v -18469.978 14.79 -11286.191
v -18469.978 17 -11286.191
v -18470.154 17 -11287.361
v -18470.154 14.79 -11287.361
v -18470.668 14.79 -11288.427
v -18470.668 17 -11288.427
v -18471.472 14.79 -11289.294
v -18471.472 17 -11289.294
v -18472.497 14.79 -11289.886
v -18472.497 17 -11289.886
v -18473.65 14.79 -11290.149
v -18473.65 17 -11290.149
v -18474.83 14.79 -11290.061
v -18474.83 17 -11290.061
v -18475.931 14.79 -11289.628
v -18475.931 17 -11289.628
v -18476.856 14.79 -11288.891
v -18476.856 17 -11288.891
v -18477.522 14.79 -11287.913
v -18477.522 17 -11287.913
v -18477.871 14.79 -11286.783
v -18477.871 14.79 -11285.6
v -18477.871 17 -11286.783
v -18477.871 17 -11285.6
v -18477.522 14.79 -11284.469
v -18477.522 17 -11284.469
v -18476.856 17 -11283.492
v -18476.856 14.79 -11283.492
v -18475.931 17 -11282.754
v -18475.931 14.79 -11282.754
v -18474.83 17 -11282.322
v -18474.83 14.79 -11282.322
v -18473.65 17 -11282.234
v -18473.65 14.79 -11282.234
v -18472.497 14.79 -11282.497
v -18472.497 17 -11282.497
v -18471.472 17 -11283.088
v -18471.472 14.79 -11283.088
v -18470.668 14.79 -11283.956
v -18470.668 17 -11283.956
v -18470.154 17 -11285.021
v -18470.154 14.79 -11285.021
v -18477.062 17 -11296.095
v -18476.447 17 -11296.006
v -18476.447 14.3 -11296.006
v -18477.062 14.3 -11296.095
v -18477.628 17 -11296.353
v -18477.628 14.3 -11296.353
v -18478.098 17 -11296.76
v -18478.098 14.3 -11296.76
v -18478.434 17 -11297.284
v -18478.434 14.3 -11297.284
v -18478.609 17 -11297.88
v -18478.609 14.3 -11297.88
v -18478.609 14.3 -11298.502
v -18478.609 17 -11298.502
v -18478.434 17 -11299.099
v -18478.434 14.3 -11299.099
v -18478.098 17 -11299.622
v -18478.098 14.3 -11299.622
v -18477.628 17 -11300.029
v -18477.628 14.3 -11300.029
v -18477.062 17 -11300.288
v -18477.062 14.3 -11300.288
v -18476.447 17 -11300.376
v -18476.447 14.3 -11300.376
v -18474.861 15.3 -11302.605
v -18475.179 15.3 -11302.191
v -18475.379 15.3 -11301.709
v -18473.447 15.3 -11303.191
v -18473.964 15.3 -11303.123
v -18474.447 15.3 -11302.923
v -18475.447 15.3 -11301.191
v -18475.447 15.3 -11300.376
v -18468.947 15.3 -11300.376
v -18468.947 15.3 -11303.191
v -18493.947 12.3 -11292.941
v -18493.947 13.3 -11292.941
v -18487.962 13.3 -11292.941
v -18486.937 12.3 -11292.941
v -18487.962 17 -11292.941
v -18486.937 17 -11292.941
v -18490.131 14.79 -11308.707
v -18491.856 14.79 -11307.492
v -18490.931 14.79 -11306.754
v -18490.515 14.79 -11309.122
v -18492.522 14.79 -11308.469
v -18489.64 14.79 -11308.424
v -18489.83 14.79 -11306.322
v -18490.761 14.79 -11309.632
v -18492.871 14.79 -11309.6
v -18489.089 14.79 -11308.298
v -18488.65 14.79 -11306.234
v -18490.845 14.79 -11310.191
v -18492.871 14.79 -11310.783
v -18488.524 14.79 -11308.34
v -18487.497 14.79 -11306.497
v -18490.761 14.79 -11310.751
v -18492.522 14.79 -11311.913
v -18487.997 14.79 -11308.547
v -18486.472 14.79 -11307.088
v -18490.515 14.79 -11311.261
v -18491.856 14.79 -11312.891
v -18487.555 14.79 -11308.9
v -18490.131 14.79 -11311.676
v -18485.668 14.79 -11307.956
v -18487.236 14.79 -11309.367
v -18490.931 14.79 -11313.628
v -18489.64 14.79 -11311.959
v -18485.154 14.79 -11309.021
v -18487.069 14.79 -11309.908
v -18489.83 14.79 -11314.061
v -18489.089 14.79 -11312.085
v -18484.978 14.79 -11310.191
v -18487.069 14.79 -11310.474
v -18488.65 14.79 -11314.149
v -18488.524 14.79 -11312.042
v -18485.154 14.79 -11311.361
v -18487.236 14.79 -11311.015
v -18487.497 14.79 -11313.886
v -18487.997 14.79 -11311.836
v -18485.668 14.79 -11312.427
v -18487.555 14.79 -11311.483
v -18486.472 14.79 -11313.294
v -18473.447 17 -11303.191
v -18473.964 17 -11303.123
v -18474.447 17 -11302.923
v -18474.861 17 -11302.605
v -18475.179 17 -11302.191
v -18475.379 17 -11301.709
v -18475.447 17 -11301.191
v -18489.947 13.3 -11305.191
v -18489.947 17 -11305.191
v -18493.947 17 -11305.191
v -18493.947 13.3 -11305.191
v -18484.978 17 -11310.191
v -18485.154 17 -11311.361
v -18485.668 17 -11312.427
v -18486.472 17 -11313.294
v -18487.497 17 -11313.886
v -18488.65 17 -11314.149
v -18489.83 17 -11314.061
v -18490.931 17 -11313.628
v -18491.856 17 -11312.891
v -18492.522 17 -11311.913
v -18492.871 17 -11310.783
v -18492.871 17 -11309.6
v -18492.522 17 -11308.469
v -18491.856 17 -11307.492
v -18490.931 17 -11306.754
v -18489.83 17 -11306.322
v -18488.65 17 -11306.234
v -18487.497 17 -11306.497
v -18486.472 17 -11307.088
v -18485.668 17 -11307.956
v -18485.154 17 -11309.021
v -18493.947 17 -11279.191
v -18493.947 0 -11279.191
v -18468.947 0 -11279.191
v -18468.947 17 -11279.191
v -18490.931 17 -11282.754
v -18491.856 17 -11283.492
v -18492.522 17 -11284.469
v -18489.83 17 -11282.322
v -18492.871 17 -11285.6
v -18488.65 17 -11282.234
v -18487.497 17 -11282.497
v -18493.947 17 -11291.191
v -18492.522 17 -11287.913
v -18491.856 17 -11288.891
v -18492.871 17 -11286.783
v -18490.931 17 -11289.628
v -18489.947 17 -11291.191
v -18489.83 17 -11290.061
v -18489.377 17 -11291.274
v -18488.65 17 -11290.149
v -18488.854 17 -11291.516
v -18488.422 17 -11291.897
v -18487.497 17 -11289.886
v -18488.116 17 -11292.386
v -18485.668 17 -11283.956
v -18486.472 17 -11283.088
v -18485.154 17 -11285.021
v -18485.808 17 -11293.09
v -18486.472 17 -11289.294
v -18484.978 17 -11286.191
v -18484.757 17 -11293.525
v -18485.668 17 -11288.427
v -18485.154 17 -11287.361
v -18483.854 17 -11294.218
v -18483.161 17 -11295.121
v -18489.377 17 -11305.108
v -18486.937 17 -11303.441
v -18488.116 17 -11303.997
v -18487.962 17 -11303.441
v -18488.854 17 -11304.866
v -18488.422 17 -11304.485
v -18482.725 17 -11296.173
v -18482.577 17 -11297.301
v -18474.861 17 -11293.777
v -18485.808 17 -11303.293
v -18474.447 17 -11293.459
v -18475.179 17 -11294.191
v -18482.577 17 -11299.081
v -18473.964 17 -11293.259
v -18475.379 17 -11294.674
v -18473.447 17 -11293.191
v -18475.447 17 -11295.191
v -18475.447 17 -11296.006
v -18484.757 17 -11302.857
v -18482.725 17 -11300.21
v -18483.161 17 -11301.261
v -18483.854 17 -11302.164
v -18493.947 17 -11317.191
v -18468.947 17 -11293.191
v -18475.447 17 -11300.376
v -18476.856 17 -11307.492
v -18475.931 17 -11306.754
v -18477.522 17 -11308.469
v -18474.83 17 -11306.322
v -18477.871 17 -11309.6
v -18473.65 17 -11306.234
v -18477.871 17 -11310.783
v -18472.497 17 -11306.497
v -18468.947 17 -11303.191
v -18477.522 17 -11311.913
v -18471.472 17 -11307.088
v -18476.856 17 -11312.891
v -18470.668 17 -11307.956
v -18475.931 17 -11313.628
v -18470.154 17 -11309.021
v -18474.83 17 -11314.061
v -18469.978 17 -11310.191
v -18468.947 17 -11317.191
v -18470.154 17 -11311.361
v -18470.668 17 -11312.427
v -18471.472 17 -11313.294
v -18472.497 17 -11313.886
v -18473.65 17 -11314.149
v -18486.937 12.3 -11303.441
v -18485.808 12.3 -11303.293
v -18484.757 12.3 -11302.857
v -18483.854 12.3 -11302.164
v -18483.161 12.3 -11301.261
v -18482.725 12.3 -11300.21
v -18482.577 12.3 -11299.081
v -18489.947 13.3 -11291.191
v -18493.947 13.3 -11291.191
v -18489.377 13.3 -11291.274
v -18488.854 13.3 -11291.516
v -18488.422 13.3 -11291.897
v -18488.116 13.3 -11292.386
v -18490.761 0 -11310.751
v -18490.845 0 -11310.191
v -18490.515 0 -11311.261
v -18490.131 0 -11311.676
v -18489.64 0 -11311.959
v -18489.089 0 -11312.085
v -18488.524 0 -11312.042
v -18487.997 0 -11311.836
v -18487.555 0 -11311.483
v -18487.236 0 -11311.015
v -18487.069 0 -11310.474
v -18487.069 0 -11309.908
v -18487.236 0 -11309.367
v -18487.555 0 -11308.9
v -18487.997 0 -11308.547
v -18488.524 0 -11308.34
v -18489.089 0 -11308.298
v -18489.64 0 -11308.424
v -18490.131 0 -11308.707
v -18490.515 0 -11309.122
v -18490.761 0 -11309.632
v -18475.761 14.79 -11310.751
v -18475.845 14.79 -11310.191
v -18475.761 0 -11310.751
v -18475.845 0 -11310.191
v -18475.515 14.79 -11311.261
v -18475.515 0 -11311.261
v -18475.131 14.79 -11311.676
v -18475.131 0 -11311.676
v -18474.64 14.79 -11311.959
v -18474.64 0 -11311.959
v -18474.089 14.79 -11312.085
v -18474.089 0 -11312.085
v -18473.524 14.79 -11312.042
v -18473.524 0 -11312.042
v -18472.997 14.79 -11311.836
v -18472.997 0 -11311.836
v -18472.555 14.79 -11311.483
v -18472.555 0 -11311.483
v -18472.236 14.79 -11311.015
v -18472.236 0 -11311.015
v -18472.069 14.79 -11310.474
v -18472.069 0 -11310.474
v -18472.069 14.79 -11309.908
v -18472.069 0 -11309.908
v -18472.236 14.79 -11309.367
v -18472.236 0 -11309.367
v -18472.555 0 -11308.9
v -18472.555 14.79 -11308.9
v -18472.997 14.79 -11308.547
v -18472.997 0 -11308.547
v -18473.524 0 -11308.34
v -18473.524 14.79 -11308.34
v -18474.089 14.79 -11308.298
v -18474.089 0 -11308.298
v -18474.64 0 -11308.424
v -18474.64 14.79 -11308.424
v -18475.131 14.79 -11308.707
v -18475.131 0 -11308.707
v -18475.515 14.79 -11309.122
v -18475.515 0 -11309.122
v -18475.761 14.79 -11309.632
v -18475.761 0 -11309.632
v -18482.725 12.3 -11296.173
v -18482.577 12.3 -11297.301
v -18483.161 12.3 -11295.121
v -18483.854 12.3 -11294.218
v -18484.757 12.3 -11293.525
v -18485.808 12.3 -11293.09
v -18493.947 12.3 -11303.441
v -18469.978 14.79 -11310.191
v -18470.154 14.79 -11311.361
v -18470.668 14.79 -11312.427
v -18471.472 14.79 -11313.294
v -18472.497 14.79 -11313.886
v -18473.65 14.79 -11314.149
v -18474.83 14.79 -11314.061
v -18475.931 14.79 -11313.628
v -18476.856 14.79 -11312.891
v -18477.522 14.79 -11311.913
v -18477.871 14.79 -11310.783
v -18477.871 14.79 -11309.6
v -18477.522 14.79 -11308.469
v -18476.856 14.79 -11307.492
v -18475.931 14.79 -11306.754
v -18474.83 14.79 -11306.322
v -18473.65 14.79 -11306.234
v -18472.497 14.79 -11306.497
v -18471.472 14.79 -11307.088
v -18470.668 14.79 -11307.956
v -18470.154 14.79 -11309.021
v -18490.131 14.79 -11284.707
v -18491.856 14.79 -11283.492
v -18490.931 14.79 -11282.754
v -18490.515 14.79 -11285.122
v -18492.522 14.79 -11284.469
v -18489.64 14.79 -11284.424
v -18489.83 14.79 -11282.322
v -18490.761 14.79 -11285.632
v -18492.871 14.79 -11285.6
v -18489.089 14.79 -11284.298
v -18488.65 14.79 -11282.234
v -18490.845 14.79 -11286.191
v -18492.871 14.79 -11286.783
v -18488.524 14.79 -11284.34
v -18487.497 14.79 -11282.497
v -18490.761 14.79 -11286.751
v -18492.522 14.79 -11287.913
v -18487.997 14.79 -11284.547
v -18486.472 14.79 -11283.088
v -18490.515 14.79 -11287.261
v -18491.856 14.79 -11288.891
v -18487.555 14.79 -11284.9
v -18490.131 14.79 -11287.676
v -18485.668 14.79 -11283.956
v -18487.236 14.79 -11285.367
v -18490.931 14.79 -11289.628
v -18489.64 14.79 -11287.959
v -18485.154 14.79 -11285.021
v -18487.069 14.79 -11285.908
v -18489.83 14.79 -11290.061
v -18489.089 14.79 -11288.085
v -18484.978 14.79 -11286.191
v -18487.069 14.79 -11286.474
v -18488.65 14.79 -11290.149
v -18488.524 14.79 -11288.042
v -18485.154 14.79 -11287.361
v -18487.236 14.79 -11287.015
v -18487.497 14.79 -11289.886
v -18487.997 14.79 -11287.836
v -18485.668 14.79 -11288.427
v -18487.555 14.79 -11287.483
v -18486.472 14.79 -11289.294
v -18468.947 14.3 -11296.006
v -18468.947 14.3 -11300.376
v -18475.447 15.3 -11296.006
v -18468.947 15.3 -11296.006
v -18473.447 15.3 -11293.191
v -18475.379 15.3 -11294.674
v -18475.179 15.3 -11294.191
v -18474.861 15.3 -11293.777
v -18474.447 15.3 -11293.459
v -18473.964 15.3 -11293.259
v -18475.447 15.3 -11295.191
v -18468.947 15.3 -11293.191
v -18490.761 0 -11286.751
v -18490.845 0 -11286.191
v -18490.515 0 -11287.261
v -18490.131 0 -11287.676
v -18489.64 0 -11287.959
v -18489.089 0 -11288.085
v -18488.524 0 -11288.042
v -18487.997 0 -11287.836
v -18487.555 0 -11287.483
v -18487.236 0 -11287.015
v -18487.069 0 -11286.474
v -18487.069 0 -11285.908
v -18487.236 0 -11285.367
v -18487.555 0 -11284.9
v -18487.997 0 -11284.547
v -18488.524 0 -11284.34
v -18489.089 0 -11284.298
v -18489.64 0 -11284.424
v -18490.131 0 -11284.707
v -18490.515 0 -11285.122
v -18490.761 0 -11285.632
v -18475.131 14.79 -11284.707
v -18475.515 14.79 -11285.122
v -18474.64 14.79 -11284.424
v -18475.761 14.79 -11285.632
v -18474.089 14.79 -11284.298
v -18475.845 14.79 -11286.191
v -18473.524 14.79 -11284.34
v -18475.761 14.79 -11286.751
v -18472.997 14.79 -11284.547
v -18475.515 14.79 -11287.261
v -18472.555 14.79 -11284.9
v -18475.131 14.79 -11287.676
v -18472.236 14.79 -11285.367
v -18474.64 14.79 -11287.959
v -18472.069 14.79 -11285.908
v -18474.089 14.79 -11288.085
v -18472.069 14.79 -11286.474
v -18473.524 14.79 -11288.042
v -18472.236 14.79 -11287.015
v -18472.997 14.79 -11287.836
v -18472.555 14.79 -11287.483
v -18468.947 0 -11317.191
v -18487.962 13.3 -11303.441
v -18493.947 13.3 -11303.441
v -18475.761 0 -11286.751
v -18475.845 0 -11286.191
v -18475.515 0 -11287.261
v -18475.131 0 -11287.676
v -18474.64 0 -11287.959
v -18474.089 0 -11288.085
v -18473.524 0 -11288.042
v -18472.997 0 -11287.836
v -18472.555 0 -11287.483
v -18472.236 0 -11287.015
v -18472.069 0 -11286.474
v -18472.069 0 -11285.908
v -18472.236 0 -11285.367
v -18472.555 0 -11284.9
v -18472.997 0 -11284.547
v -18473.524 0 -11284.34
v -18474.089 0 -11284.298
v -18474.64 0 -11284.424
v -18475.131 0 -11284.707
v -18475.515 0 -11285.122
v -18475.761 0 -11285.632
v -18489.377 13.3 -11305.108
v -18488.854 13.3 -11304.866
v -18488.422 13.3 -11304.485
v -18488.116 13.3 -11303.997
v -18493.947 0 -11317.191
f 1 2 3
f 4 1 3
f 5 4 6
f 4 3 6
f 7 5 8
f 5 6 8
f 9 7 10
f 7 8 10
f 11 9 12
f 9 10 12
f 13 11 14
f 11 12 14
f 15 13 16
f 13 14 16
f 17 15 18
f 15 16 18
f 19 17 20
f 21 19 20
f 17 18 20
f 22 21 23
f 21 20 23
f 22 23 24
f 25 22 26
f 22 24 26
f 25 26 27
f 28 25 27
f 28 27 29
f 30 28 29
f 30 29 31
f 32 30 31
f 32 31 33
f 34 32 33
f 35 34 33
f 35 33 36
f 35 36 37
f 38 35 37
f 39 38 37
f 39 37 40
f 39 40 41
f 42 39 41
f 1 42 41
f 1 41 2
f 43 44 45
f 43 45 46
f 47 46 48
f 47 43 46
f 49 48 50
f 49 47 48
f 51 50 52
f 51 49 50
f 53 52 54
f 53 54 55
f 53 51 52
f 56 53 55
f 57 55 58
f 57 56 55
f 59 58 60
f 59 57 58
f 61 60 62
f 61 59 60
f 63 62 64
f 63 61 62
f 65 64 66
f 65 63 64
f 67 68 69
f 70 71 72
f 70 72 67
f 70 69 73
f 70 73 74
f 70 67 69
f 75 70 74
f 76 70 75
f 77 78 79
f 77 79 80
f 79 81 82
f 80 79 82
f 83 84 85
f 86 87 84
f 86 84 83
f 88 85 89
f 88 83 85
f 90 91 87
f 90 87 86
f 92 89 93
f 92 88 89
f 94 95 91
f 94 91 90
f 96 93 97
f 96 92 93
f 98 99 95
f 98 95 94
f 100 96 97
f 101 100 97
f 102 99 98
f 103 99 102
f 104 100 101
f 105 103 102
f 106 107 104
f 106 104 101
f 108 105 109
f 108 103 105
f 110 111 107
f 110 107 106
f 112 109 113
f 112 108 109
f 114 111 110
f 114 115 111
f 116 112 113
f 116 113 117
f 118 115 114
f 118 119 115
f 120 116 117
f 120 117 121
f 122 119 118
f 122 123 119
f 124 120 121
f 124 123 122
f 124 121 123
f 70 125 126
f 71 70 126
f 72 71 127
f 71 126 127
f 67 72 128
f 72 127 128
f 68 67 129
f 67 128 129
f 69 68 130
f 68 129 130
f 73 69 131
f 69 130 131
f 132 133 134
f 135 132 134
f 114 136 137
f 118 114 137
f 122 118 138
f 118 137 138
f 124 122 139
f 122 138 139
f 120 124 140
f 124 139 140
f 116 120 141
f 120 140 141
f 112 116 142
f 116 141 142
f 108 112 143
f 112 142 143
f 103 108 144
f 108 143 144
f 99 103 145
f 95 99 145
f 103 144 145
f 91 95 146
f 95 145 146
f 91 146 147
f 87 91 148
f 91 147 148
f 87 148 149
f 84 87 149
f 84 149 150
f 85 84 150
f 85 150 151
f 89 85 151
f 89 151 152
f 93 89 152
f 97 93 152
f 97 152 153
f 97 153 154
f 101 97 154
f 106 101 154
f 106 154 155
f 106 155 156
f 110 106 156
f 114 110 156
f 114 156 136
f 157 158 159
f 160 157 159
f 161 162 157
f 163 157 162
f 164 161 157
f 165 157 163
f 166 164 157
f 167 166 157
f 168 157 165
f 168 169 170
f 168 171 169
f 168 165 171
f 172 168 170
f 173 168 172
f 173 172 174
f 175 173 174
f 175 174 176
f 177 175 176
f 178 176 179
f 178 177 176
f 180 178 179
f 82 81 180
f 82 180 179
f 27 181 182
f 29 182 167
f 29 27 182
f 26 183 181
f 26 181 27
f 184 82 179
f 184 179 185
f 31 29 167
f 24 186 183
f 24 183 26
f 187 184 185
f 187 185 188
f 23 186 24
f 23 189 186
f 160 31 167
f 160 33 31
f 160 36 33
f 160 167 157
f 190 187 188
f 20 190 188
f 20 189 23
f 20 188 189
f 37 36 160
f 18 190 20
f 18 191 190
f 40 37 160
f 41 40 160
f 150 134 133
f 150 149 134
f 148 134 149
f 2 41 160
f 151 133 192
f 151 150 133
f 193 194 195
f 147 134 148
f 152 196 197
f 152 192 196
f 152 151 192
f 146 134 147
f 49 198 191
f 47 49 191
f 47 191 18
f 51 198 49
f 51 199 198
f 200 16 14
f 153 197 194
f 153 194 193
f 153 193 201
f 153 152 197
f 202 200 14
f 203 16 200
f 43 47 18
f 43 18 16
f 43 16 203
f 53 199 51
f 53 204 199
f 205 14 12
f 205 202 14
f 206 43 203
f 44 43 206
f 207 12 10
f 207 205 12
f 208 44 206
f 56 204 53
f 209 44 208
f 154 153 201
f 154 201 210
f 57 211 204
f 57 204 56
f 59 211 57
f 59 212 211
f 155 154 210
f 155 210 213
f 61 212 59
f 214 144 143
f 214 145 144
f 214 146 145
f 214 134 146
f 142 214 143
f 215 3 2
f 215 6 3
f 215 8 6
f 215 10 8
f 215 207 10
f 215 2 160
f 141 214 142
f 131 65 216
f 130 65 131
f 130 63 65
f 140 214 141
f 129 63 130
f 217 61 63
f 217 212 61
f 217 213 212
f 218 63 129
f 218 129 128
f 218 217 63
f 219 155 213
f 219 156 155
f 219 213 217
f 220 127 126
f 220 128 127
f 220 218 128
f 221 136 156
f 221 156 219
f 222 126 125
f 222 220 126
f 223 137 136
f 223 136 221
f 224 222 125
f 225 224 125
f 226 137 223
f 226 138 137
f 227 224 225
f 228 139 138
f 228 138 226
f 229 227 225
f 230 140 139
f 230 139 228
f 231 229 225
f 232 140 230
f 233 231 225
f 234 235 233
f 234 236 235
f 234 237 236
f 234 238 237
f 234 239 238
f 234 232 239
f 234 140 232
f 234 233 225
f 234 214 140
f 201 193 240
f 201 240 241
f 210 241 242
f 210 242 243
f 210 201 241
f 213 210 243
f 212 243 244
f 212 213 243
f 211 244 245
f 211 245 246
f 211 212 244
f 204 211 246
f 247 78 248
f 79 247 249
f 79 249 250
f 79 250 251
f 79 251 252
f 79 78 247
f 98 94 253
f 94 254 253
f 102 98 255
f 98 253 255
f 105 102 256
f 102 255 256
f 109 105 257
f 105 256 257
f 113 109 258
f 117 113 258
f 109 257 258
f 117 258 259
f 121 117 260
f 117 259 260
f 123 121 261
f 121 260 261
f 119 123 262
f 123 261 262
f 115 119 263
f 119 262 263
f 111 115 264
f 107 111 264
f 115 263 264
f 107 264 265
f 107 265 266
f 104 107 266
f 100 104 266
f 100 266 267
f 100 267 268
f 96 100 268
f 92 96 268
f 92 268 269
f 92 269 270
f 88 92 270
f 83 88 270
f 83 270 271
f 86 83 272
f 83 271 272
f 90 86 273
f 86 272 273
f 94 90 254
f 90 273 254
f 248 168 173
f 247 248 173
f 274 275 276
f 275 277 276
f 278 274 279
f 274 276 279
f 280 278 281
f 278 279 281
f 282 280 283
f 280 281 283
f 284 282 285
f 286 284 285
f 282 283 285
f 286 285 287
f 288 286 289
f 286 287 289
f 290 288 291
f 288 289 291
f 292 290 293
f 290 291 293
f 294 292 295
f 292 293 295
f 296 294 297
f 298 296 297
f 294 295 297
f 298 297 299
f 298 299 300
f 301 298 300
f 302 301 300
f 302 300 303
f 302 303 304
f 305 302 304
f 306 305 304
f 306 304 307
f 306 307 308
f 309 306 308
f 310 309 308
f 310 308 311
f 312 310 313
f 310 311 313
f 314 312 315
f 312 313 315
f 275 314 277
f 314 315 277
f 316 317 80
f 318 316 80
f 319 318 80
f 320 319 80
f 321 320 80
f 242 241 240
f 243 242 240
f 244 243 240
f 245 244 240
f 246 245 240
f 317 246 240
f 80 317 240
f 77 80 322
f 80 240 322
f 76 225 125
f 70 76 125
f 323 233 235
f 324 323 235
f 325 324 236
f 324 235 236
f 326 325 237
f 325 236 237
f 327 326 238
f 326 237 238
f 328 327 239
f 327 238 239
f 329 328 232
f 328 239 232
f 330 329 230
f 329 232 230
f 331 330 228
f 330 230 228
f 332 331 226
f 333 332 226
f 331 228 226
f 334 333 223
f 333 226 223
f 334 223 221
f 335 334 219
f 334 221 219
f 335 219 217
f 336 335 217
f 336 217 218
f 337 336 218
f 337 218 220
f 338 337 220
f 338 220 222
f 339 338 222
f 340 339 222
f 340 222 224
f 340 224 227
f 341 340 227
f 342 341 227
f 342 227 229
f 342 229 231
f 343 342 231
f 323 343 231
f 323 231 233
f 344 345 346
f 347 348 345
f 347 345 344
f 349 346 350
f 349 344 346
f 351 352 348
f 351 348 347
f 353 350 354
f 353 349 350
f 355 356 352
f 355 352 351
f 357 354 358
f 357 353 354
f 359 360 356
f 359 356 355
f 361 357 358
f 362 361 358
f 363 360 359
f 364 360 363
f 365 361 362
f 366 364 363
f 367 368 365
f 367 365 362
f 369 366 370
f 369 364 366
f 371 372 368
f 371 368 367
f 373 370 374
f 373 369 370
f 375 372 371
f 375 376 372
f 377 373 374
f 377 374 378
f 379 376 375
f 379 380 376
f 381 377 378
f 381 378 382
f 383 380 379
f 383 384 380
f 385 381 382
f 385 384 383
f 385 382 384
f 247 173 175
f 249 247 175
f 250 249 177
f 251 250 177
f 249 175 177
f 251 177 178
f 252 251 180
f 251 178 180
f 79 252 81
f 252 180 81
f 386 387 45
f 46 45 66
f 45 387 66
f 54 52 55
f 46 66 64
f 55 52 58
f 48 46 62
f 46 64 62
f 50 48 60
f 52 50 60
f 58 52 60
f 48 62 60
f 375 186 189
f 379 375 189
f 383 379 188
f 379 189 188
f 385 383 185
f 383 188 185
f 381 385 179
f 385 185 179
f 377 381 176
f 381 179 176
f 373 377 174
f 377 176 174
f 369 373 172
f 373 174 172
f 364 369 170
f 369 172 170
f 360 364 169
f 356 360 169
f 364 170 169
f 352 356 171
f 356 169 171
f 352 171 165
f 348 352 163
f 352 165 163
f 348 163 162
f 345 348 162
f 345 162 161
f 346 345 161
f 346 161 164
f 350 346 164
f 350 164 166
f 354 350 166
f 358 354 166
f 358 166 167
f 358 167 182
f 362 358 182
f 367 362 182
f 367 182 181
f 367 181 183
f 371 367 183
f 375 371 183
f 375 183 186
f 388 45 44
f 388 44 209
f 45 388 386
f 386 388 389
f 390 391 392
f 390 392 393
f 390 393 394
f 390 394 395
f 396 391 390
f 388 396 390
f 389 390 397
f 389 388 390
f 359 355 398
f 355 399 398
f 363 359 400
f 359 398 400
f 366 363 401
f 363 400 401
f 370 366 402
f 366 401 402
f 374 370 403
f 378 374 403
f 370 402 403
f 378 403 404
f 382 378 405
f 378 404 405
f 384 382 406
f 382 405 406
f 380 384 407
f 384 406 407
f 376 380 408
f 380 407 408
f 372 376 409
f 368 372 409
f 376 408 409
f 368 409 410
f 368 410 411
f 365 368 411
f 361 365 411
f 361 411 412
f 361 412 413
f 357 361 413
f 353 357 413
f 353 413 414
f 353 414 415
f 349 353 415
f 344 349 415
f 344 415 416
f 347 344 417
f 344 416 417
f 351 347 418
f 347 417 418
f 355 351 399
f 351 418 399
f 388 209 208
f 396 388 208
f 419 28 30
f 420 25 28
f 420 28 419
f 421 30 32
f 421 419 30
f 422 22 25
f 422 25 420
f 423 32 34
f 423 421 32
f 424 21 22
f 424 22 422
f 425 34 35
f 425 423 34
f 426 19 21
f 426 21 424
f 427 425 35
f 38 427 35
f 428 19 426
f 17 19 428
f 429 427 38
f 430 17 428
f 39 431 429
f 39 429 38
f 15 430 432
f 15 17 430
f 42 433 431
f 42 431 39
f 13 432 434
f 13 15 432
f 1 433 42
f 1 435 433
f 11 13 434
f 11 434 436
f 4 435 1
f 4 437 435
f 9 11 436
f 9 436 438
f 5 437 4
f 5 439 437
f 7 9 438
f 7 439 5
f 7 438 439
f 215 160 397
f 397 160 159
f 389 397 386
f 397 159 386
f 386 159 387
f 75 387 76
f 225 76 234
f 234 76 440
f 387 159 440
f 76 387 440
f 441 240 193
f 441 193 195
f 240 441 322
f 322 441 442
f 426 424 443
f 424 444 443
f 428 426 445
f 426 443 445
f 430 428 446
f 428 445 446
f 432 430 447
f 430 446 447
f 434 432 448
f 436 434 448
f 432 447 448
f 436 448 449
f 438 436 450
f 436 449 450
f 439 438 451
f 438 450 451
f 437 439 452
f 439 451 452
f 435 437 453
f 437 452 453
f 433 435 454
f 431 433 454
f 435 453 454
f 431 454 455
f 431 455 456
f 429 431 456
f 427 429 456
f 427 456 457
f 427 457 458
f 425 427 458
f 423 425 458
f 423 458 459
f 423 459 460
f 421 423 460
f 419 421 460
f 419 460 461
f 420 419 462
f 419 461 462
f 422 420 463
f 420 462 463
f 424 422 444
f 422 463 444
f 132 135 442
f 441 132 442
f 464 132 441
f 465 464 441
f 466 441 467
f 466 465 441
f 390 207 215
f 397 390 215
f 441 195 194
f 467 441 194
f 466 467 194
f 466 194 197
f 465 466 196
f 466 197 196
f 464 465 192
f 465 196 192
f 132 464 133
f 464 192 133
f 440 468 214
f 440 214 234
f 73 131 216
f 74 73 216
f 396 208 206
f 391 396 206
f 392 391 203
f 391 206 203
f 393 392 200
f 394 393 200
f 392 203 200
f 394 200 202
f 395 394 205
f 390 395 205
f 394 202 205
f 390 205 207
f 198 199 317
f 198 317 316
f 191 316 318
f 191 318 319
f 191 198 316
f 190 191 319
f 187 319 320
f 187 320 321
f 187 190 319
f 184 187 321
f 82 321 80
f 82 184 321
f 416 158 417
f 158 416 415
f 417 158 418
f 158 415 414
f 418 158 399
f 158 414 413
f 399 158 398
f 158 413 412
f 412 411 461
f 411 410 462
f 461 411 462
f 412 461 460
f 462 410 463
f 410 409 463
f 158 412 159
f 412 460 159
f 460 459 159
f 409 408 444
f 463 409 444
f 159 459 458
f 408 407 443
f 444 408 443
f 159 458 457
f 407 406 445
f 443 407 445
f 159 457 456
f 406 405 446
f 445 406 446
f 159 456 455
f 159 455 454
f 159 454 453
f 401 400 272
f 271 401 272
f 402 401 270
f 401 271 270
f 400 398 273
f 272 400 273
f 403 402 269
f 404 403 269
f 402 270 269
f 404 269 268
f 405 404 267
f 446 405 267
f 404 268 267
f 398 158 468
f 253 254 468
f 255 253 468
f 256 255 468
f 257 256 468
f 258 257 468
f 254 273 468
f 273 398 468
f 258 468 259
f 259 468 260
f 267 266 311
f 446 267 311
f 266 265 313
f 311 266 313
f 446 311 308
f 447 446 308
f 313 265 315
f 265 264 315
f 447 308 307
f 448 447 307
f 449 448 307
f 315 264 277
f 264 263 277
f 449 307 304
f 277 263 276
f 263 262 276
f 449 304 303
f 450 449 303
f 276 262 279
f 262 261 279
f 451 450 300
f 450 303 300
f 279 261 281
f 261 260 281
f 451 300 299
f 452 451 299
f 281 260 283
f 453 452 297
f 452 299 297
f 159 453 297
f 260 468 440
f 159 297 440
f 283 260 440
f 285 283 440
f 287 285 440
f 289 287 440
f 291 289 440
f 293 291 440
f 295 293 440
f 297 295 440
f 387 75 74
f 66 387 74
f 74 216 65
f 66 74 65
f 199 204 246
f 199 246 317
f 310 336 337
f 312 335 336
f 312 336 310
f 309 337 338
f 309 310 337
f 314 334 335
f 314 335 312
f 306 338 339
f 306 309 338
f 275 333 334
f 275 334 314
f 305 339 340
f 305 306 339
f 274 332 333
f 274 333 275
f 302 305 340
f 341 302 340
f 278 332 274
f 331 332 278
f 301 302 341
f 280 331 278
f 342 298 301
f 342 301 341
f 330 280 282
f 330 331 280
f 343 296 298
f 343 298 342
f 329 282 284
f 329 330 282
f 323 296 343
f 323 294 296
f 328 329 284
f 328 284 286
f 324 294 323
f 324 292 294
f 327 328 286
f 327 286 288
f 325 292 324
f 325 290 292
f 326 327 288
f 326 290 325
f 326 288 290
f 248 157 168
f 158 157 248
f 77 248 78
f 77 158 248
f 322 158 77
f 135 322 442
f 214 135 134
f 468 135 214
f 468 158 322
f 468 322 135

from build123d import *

# Parameters (mm, degrees)
SKETCH1_W                                           = 25
SKETCH1_H                                           = 38
BOSS_EXTRUDE1_DEPTH                                 = 17
CUT_EXTRUDE3_DEPTH                                  = 3.7
CUT_EXTRUDE4_DEPTH                                  = 1.7
CBORE_FOR_6_BINDING_HEAD_MACHINE_SCREW1_D           = 3.7973
CBORE_FOR_6_BINDING_HEAD_MACHINE_SCREW1_CBORE_D     = 7.9375
CBORE_FOR_6_BINDING_HEAD_MACHINE_SCREW1_CBORE_DEPTH = 2.2098
SKETCH12_W                                          = 1
SKETCH12_H                                          = 4.37
SKETCH12_W_2                                        = 6.5
CUT_EXTRUDE5_DEPTH                                  = 2.7
CUT_EXTRUDE6_DEPTH                                  = 4.7


with BuildPart() as part:
    # Sketch1 → Boss-Extrude1 (new body)
    with BuildSketch(Plane(origin=(0, 0, 0), x_dir=(1, 0, 0), z_dir=(0, 1, 0))):
        with Locations((-18481.446731235, 11298.191283293)):
            Rectangle(SKETCH1_W, SKETCH1_H)
    extrude(amount=BOSS_EXTRUDE1_DEPTH)

    # Sketch2 → Cut-Extrude3 (cut)
    with BuildSketch(Plane(origin=(0, 17, 0), x_dir=(1, 0, 0), z_dir=(0, 1, 0))):
        with BuildLine():
            Line((-18493.946731235, 11291.191283293), (-18489.946731235, 11291.191283293))
            ThreePointArc((-18489.946731235, 11291.191283293), (-18488.532517672, 11291.777069731), (-18487.946731235, 11293.191283293))
            Line((-18487.946731235, 11293.191283293), (-18487.946731235, 11303.191283293))
            ThreePointArc((-18487.946731235, 11303.191283293), (-18488.532517672, 11304.605496855), (-18489.946731235, 11305.191283293))
            Line((-18489.946731235, 11305.191283293), (-18493.946731235, 11305.191283293))
            Line((-18493.946731235, 11305.191283293), (-18493.946731235, 11291.191283293))
        make_face()
    extrude(amount=-CUT_EXTRUDE3_DEPTH, mode=Mode.SUBTRACT)

    # Sketch2<6> → Cut-Extrude4 (cut)
    with BuildSketch(Plane(origin=(0, 17, 0), x_dir=(1, 0, 0), z_dir=(0, 1, 0))):
        with BuildLine():
            Line((-18475.446731235, 11301.191283293), (-18475.446731235, 11295.191283293))
            ThreePointArc((-18475.446731235, 11295.191283293), (-18474.860944797, 11293.777069731), (-18473.446731235, 11293.191283293))
            Line((-18473.446731235, 11293.191283293), (-18468.946731235, 11293.191283293))
            Line((-18468.946731235, 11293.191283293), (-18468.946731235, 11303.191283293))
            Line((-18468.946731235, 11303.191283293), (-18473.446731235, 11303.191283293))
            ThreePointArc((-18473.446731235, 11303.191283293), (-18474.860944797, 11302.605496855), (-18475.446731235, 11301.191283293))
        make_face()
    extrude(amount=-CUT_EXTRUDE4_DEPTH, mode=Mode.SUBTRACT)

    # CBORE for #6 Binding Head Machine Screw1 (through all)
    with Locations(Plane(origin=(0, 17, 0), x_dir=(1, 0, 0), z_dir=(0, 1, 0))):
        with Locations((-18488.946731235, 11310.191283293), (-18473.946731235, 11310.191283293), (-18473.946731235, 11286.191283293), (-18488.946731235, 11286.191283293)):
            CounterBoreHole(CBORE_FOR_6_BINDING_HEAD_MACHINE_SCREW1_D / 2, CBORE_FOR_6_BINDING_HEAD_MACHINE_SCREW1_CBORE_D / 2, CBORE_FOR_6_BINDING_HEAD_MACHINE_SCREW1_CBORE_DEPTH)

    # Sketch12 → Cut-Extrude5 (cut)
    with BuildSketch(Plane(origin=(0, 17, 0), x_dir=(1, 0, 0), z_dir=(0, 1, 0))):
        with BuildLine():
            Line((-18476.446731235, 11300.376283293), (-18476.446731235, 11296.006283293))
            ThreePointArc((-18476.446731235, 11296.006283293), (-18478.631731235, 11298.191283293), (-18476.446731235, 11300.376283293))
        make_face()
        with Locations((-18475.946731235, 11298.191283293)):
            Rectangle(SKETCH12_W, SKETCH12_H)
        with Locations((-18472.196731235, 11298.191283293)):
            Rectangle(SKETCH12_W_2, SKETCH12_H)
    extrude(amount=-CUT_EXTRUDE5_DEPTH, mode=Mode.SUBTRACT)

    # Sketch13 → Cut-Extrude6 (cut)
    with BuildSketch(Plane(origin=(0, 17, 0), x_dir=(1, 0, 0), z_dir=(0, 1, 0))):
        with BuildLine():
            ThreePointArc((-18486.936731235, 11303.441283293), (-18483.853745669, 11302.164268859), (-18482.576731235, 11299.081283293))
            Line((-18482.576731235, 11299.081283293), (-18482.576731235, 11297.301283293))
            ThreePointArc((-18482.576731235, 11297.301283293), (-18483.853745669, 11294.218297727), (-18486.936731235, 11292.941283293))
            Line((-18486.936731235, 11292.941283293), (-18486.946731235, 11292.941283293))
            Line((-18486.946731235, 11292.941283293), (-18486.946731235, 11303.441283293))
            Line((-18486.946731235, 11303.441283293), (-18486.936731235, 11303.441283293))
        make_face()
        with BuildLine():
            ThreePointArc((-18487.946731235, 11303.191283293), (-18487.950656716, 11303.316529118), (-18487.962417752, 11303.441283293))
            Line((-18487.962417752, 11303.441283293), (-18493.946731235, 11303.441283293))
            Line((-18493.946731235, 11303.441283293), (-18493.946731235, 11292.941283293))
            Line((-18493.946731235, 11292.941283293), (-18487.962417752, 11292.941283293))
            ThreePointArc((-18487.962417752, 11292.941283293), (-18487.950656716, 11293.066037468), (-18487.946731235, 11293.191283293))
            Line((-18487.946731235, 11293.191283293), (-18487.946731235, 11303.191283293))
        make_face()
        with BuildLine():
            Line((-18486.946731235, 11292.941283293), (-18486.946731235, 11303.441283293))
            Line((-18486.946731235, 11303.441283293), (-18487.962417752, 11303.441283293))
            ThreePointArc((-18487.962417752, 11303.441283293), (-18487.950656716, 11303.316529118), (-18487.946731235, 11303.191283293))
            Line((-18487.946731235, 11303.191283293), (-18487.946731235, 11293.191283293))
            ThreePointArc((-18487.946731235, 11293.191283293), (-18487.950656716, 11293.066037468), (-18487.962417752, 11292.941283293))
            Line((-18487.962417752, 11292.941283293), (-18486.946731235, 11292.941283293))
        make_face()
    extrude(amount=-CUT_EXTRUDE6_DEPTH, mode=Mode.SUBTRACT)


solid = part.part
